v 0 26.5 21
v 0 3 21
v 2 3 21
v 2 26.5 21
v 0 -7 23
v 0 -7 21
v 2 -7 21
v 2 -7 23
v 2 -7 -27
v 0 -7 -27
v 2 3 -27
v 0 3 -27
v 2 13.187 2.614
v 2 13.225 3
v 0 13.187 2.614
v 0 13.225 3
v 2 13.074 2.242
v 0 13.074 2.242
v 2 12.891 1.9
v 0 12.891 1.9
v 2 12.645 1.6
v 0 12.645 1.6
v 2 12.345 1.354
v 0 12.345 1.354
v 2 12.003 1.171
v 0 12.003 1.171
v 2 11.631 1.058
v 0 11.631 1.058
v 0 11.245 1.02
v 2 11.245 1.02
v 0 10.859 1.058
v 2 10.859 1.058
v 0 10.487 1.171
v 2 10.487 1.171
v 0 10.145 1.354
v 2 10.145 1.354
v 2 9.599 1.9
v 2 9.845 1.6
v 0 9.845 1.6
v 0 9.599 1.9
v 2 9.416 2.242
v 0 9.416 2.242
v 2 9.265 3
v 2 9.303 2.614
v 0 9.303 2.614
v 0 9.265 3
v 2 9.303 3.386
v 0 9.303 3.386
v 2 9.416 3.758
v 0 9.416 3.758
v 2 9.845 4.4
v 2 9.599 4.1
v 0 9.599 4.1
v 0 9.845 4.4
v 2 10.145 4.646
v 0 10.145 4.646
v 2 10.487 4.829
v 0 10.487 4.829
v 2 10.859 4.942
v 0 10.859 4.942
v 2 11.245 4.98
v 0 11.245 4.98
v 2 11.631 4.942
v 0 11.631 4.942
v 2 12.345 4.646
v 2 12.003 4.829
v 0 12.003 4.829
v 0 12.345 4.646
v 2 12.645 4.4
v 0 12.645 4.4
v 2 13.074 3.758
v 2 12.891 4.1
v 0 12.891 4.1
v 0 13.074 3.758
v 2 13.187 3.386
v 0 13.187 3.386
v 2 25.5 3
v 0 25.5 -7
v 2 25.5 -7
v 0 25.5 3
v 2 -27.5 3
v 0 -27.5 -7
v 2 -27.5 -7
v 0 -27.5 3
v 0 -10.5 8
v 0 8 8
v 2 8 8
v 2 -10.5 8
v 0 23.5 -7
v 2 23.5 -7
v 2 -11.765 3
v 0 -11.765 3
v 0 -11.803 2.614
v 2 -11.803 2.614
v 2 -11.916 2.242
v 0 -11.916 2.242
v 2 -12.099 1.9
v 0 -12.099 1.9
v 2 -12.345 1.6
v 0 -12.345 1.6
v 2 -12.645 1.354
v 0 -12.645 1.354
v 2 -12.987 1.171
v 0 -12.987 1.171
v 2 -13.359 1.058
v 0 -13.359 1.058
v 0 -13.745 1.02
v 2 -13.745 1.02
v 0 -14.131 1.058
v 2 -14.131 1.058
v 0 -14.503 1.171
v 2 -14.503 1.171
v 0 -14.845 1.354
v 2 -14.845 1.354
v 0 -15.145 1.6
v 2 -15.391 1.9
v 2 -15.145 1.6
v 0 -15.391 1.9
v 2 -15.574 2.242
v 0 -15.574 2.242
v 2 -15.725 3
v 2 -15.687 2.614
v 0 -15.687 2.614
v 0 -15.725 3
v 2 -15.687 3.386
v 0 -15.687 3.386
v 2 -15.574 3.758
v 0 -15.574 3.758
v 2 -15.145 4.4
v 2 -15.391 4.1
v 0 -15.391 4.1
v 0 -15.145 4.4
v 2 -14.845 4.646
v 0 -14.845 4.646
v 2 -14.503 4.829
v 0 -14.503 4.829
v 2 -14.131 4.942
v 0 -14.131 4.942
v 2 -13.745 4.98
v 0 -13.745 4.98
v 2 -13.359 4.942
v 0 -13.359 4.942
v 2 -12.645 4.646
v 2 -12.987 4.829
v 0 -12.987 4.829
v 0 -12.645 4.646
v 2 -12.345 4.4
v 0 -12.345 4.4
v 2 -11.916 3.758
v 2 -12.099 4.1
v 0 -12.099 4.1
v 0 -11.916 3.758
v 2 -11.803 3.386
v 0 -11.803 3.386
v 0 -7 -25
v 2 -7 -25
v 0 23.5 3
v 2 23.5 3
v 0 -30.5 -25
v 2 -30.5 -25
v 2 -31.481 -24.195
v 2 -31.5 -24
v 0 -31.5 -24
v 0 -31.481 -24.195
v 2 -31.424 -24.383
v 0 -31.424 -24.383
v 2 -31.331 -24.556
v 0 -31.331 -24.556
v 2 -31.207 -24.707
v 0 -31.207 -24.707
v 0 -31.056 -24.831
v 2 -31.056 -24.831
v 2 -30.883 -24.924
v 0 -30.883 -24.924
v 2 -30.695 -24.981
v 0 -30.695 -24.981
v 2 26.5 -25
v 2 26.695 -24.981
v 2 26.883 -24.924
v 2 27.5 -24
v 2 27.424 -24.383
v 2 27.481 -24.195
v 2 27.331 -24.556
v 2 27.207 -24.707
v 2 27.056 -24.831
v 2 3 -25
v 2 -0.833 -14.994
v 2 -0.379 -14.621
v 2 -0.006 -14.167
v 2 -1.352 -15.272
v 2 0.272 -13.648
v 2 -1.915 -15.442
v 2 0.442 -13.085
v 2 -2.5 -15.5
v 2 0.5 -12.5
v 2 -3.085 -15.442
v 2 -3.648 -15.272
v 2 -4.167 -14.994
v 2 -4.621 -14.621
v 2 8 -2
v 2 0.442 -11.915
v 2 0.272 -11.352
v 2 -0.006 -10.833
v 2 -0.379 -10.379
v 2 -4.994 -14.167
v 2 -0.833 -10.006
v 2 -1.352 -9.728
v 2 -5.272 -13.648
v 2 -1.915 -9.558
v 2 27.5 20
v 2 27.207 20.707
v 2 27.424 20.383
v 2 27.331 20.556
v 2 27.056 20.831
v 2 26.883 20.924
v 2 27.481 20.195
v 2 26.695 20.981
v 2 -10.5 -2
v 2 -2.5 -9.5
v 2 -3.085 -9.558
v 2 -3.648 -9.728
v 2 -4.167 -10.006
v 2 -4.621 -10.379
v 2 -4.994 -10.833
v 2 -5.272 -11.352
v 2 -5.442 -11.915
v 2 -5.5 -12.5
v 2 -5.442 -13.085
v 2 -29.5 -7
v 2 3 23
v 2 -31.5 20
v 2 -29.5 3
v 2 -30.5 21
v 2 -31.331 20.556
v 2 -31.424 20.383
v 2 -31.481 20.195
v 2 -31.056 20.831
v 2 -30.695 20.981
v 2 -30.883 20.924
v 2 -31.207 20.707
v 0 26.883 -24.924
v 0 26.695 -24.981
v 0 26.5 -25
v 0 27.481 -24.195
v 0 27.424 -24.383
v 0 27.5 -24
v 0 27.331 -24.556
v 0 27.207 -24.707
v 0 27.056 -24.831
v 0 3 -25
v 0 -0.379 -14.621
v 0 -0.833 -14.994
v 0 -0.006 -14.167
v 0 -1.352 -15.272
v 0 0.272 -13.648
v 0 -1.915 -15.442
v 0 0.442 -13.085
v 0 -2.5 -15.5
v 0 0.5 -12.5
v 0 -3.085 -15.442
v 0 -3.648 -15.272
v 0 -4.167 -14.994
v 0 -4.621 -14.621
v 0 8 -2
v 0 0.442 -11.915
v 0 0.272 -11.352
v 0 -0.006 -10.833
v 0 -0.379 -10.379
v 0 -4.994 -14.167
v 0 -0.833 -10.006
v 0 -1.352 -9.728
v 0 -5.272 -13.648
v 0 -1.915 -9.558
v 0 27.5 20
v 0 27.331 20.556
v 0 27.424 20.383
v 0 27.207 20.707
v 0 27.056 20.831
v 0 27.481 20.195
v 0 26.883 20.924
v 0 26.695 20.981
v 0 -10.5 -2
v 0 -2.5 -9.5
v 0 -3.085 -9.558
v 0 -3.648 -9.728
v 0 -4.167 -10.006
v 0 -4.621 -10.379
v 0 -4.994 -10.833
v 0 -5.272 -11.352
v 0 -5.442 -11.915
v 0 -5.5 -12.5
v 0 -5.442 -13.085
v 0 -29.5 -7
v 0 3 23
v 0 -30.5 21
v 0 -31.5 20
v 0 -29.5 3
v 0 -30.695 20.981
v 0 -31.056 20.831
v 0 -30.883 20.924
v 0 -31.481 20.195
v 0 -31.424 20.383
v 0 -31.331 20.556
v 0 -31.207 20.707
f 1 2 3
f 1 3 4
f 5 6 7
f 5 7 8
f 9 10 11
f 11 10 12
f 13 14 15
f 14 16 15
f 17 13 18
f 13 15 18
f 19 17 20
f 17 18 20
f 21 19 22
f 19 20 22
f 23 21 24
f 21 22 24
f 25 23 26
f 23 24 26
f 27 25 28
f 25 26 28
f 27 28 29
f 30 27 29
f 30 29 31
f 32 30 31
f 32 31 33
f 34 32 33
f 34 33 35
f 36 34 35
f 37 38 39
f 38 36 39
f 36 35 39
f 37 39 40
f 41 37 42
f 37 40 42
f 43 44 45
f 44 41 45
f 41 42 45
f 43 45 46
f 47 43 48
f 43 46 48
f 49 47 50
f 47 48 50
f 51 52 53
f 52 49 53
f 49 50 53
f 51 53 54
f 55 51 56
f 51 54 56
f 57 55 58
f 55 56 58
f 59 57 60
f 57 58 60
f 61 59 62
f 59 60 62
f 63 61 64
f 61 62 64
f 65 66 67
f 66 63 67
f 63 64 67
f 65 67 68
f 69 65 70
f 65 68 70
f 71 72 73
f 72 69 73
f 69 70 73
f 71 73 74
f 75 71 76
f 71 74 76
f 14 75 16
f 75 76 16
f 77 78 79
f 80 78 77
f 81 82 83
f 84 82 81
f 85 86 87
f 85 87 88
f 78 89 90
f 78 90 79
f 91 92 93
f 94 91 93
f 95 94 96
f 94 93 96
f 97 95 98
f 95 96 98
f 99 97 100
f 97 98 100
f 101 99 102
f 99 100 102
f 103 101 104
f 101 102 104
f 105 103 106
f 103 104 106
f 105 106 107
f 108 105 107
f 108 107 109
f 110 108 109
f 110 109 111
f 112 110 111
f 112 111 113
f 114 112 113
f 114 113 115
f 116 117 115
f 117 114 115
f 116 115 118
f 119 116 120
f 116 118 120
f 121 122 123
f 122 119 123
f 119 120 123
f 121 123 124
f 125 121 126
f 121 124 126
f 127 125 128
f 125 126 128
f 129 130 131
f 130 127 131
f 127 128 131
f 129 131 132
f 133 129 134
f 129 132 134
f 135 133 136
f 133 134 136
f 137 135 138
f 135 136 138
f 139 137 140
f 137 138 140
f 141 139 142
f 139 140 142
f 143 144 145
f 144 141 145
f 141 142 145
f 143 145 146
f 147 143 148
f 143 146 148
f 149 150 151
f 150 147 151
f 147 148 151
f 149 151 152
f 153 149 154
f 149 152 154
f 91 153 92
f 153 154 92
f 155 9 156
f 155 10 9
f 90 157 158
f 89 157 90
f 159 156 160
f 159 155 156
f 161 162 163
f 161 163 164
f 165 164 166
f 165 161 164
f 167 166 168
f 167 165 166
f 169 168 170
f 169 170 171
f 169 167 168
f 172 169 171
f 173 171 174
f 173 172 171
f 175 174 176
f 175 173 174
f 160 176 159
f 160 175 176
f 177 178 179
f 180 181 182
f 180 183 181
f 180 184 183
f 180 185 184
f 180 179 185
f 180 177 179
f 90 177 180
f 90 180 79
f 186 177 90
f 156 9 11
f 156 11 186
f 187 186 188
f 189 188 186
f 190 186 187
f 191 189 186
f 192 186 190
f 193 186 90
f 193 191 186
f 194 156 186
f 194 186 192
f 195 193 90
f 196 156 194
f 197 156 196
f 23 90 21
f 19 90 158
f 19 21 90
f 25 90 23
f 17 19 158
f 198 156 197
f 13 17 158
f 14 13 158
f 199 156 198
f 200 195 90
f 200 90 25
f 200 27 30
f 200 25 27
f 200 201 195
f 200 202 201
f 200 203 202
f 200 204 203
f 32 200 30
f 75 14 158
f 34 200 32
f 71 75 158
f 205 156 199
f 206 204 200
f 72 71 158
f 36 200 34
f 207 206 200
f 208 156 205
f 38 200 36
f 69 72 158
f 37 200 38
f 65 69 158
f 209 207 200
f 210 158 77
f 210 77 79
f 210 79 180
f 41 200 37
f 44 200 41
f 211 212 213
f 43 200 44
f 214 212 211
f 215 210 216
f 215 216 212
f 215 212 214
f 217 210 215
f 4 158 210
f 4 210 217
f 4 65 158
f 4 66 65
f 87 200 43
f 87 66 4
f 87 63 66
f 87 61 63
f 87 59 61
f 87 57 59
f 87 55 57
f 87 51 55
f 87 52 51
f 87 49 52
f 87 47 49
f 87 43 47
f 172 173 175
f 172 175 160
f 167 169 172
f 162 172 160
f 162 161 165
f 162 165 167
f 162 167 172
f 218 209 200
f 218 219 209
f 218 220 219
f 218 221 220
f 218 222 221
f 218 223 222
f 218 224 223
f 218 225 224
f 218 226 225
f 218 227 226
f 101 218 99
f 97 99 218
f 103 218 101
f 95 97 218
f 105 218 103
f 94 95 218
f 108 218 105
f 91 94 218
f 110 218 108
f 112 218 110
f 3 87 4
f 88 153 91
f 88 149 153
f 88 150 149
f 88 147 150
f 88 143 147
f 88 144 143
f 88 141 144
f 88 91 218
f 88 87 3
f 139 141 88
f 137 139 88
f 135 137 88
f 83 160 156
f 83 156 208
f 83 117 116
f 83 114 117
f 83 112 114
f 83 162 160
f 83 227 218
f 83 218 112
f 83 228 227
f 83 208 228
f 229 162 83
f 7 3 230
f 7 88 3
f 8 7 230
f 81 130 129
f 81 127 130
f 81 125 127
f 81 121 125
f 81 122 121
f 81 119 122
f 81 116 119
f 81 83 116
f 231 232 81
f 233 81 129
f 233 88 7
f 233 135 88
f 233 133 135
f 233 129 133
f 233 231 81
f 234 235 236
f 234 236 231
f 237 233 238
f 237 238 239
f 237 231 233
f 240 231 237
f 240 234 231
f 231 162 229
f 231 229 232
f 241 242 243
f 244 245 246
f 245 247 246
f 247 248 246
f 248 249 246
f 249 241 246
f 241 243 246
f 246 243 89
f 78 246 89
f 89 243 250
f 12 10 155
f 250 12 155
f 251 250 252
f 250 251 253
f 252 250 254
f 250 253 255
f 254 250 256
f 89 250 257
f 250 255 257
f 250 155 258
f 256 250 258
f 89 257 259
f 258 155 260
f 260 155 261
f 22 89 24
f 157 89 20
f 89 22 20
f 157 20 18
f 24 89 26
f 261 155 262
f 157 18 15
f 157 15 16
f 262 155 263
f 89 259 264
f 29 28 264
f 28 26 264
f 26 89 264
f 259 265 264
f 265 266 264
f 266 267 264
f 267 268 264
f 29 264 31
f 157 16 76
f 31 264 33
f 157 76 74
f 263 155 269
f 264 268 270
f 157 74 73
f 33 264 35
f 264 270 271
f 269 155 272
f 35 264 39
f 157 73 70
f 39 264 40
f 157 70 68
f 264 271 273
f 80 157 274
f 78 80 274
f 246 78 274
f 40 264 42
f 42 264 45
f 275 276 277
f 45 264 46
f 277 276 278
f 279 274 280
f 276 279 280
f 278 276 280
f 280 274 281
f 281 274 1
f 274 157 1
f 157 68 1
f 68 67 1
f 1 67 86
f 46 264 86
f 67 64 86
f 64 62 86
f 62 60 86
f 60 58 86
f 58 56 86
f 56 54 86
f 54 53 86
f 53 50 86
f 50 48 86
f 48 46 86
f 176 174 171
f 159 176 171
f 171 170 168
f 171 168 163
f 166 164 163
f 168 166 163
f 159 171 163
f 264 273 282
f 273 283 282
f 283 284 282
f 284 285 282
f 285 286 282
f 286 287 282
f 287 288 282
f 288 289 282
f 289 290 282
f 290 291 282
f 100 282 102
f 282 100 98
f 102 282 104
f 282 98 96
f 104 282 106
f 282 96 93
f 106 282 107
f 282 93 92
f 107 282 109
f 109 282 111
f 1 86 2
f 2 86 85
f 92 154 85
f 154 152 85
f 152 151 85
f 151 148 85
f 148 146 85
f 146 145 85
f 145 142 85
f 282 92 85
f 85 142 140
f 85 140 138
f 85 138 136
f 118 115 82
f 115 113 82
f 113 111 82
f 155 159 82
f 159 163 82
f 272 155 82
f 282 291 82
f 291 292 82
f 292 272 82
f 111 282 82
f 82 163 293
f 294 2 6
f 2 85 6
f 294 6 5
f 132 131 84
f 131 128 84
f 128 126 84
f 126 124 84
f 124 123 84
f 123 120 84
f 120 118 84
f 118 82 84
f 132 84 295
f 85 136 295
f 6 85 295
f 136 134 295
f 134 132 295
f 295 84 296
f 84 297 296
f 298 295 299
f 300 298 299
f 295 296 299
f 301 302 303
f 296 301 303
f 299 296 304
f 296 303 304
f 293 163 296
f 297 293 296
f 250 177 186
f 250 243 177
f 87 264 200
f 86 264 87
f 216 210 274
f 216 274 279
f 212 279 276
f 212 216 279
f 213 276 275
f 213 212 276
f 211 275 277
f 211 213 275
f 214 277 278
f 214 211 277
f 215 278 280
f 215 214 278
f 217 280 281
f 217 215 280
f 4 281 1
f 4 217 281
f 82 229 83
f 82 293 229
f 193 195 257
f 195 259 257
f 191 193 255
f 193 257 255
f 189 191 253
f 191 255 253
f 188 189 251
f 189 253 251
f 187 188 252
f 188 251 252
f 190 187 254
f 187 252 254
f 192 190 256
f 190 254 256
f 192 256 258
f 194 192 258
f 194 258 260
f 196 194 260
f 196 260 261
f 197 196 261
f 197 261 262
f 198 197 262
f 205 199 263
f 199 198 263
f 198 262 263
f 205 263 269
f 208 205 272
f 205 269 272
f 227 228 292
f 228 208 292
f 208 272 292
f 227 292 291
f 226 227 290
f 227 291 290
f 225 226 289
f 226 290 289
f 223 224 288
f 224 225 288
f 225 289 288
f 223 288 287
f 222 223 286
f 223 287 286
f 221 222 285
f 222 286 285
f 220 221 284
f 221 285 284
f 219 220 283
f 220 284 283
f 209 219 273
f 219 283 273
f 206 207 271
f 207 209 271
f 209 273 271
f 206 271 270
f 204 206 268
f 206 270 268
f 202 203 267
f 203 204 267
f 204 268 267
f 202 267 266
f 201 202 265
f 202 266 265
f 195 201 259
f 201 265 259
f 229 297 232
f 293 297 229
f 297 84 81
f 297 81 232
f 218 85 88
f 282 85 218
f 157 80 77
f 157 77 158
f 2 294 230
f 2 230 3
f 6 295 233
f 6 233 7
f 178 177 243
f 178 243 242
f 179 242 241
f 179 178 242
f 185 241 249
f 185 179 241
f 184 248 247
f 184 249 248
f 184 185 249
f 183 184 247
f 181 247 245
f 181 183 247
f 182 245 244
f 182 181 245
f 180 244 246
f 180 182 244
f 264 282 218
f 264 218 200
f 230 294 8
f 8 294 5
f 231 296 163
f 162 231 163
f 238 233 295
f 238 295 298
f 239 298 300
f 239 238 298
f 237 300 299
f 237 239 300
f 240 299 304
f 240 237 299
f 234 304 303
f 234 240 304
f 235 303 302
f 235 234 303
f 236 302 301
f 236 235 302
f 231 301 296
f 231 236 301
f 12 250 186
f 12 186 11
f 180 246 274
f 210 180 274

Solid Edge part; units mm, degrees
sketch "Sketch1" plane through (0, 0, 0) normal (1, 0, 0) x (0, 1, 0)
  line L0 (27.5, -27) -> (27.5, 23)
  line L1 (27.5, 23) -> (-31.5, 23)
  line L2 (-31.5, 23) -> (-31.5, -27)
  line L3 (-31.5, -27) -> (27.5, -27)
extrude "Protrusion1" add sketch "Sketch1" along normal blind 2
sketch "Sketch2" plane through (0, 0, 0) normal (1, 0, 0) x (0, 1, 0)
  line L0 (-31.5, 21) -> (-7, 21)
  line L1 (-7, 21) -> (-7, 23)
  line L2 (-7, 23) -> (-31.5, 23)
  line L3 (-31.5, 23) -> (-31.5, 21)
extrude "ExtrudedCutout_1" cut sketch "Sketch2" along normal blind 2
sketch "Sketch3" plane through (0, 0, 0) normal (1, 0, 0) x (0, 1, 0)
  line L0 (3, 21) -> (27.5, 21)
  line L1 (27.5, 21) -> (27.5, 23)
  line L2 (27.5, 23) -> (3, 23)
  line L3 (3, 23) -> (3, 21)
extrude "ExtrudedCutout_2" cut sketch "Sketch3" along normal blind 2
sketch "Sketch4" plane through (0, 0, 0) normal (1, 0, 0) x (0, 1, 0)
  line L0 (23.5, 3) -> (23.5, -7)
  line L1 (23.5, -7) -> (25.5, -7)
  line L2 (25.5, -7) -> (25.5, 3)
  line L3 (25.5, 3) -> (23.5, 3)
extrude "ExtrudedCutout_3" cut sketch "Sketch4" along normal blind 2
sketch "Sketch5" plane through (0, 0, 0) normal (1, 0, 0) x (0, 1, 0)
  line L0 (27.5, -25) -> (3, -25)
  line L1 (3, -25) -> (3, -27)
  line L2 (3, -27) -> (27.5, -27)
  line L3 (27.5, -27) -> (27.5, -25)
extrude "ExtrudedCutout_4" cut sketch "Sketch5" along normal blind 4
sketch "Sketch6" plane through (0, 0, 0) normal (1, 0, 0) x (0, 1, 0)
  line L0 (-7, -25) -> (-31.5, -25)
  line L1 (-31.5, -25) -> (-31.5, -27)
  line L2 (-31.5, -27) -> (-7, -27)
  line L3 (-7, -27) -> (-7, -25)
extrude "ExtrudedCutout_5" cut sketch "Sketch6" along normal blind 2
sketch "Sketch7" plane through (0, 0, 0) normal (1, 0, 0) x (0, 1, 0)
  line L0 (-29.5, -7) -> (-27.5, -7)
  line L1 (-27.5, -7) -> (-27.5, 3)
  line L2 (-27.5, 3) -> (-29.5, 3)
  line L3 (-29.5, 3) -> (-29.5, -7)
extrude "ExtrudedCutout_6" cut sketch "Sketch7" along normal blind 4
sketch "Sketch8" plane through (0, 0, 0) normal (1, 0, 0) x (0, 1, 0)
  line L0 (8, 8) -> (-10.5, 8)
  line L1 (-10.5, 8) -> (-10.5, -2)
  line L2 (-10.5, -2) -> (8, -2)
  line L3 (8, -2) -> (8, 8)
  circle A0 centre (-13.745, 3) radius 1.98
  circle A1 centre (11.245, 3) radius 1.98
  dimension "D1" = 18.5
  dimension "D2" = 10
  dimension "D3" = 23
  dimension "D4" = 17
  dimension "D5" = 3.96
  dimension "D6" = 3.96
  dimension "D7" = 3.245
  dimension "D8" = 28
  dimension "D9" = 28
  dimension "D10" = 3.245
  dimension "D11" = 24.99
extrude "ExtrudedCutout_9" cut sketch "Sketch8" along normal blind 2
sketch "Sketch9" plane through (0, 0, 0) normal (1, 0, 0) x (0, 1, 0)
  circle A0 centre (-2.5, -12.5) radius 3
extrude "ExtrudedCutout_10" cut sketch "Sketch9" along normal blind 2
fillet "Round_1" radius 1 4 edges at (1, 27.5, -25) (1, 27.5, 21) (1, -31.5, -25) (1, -31.5, 21)
properties material "Acrylic, high impact grade"
